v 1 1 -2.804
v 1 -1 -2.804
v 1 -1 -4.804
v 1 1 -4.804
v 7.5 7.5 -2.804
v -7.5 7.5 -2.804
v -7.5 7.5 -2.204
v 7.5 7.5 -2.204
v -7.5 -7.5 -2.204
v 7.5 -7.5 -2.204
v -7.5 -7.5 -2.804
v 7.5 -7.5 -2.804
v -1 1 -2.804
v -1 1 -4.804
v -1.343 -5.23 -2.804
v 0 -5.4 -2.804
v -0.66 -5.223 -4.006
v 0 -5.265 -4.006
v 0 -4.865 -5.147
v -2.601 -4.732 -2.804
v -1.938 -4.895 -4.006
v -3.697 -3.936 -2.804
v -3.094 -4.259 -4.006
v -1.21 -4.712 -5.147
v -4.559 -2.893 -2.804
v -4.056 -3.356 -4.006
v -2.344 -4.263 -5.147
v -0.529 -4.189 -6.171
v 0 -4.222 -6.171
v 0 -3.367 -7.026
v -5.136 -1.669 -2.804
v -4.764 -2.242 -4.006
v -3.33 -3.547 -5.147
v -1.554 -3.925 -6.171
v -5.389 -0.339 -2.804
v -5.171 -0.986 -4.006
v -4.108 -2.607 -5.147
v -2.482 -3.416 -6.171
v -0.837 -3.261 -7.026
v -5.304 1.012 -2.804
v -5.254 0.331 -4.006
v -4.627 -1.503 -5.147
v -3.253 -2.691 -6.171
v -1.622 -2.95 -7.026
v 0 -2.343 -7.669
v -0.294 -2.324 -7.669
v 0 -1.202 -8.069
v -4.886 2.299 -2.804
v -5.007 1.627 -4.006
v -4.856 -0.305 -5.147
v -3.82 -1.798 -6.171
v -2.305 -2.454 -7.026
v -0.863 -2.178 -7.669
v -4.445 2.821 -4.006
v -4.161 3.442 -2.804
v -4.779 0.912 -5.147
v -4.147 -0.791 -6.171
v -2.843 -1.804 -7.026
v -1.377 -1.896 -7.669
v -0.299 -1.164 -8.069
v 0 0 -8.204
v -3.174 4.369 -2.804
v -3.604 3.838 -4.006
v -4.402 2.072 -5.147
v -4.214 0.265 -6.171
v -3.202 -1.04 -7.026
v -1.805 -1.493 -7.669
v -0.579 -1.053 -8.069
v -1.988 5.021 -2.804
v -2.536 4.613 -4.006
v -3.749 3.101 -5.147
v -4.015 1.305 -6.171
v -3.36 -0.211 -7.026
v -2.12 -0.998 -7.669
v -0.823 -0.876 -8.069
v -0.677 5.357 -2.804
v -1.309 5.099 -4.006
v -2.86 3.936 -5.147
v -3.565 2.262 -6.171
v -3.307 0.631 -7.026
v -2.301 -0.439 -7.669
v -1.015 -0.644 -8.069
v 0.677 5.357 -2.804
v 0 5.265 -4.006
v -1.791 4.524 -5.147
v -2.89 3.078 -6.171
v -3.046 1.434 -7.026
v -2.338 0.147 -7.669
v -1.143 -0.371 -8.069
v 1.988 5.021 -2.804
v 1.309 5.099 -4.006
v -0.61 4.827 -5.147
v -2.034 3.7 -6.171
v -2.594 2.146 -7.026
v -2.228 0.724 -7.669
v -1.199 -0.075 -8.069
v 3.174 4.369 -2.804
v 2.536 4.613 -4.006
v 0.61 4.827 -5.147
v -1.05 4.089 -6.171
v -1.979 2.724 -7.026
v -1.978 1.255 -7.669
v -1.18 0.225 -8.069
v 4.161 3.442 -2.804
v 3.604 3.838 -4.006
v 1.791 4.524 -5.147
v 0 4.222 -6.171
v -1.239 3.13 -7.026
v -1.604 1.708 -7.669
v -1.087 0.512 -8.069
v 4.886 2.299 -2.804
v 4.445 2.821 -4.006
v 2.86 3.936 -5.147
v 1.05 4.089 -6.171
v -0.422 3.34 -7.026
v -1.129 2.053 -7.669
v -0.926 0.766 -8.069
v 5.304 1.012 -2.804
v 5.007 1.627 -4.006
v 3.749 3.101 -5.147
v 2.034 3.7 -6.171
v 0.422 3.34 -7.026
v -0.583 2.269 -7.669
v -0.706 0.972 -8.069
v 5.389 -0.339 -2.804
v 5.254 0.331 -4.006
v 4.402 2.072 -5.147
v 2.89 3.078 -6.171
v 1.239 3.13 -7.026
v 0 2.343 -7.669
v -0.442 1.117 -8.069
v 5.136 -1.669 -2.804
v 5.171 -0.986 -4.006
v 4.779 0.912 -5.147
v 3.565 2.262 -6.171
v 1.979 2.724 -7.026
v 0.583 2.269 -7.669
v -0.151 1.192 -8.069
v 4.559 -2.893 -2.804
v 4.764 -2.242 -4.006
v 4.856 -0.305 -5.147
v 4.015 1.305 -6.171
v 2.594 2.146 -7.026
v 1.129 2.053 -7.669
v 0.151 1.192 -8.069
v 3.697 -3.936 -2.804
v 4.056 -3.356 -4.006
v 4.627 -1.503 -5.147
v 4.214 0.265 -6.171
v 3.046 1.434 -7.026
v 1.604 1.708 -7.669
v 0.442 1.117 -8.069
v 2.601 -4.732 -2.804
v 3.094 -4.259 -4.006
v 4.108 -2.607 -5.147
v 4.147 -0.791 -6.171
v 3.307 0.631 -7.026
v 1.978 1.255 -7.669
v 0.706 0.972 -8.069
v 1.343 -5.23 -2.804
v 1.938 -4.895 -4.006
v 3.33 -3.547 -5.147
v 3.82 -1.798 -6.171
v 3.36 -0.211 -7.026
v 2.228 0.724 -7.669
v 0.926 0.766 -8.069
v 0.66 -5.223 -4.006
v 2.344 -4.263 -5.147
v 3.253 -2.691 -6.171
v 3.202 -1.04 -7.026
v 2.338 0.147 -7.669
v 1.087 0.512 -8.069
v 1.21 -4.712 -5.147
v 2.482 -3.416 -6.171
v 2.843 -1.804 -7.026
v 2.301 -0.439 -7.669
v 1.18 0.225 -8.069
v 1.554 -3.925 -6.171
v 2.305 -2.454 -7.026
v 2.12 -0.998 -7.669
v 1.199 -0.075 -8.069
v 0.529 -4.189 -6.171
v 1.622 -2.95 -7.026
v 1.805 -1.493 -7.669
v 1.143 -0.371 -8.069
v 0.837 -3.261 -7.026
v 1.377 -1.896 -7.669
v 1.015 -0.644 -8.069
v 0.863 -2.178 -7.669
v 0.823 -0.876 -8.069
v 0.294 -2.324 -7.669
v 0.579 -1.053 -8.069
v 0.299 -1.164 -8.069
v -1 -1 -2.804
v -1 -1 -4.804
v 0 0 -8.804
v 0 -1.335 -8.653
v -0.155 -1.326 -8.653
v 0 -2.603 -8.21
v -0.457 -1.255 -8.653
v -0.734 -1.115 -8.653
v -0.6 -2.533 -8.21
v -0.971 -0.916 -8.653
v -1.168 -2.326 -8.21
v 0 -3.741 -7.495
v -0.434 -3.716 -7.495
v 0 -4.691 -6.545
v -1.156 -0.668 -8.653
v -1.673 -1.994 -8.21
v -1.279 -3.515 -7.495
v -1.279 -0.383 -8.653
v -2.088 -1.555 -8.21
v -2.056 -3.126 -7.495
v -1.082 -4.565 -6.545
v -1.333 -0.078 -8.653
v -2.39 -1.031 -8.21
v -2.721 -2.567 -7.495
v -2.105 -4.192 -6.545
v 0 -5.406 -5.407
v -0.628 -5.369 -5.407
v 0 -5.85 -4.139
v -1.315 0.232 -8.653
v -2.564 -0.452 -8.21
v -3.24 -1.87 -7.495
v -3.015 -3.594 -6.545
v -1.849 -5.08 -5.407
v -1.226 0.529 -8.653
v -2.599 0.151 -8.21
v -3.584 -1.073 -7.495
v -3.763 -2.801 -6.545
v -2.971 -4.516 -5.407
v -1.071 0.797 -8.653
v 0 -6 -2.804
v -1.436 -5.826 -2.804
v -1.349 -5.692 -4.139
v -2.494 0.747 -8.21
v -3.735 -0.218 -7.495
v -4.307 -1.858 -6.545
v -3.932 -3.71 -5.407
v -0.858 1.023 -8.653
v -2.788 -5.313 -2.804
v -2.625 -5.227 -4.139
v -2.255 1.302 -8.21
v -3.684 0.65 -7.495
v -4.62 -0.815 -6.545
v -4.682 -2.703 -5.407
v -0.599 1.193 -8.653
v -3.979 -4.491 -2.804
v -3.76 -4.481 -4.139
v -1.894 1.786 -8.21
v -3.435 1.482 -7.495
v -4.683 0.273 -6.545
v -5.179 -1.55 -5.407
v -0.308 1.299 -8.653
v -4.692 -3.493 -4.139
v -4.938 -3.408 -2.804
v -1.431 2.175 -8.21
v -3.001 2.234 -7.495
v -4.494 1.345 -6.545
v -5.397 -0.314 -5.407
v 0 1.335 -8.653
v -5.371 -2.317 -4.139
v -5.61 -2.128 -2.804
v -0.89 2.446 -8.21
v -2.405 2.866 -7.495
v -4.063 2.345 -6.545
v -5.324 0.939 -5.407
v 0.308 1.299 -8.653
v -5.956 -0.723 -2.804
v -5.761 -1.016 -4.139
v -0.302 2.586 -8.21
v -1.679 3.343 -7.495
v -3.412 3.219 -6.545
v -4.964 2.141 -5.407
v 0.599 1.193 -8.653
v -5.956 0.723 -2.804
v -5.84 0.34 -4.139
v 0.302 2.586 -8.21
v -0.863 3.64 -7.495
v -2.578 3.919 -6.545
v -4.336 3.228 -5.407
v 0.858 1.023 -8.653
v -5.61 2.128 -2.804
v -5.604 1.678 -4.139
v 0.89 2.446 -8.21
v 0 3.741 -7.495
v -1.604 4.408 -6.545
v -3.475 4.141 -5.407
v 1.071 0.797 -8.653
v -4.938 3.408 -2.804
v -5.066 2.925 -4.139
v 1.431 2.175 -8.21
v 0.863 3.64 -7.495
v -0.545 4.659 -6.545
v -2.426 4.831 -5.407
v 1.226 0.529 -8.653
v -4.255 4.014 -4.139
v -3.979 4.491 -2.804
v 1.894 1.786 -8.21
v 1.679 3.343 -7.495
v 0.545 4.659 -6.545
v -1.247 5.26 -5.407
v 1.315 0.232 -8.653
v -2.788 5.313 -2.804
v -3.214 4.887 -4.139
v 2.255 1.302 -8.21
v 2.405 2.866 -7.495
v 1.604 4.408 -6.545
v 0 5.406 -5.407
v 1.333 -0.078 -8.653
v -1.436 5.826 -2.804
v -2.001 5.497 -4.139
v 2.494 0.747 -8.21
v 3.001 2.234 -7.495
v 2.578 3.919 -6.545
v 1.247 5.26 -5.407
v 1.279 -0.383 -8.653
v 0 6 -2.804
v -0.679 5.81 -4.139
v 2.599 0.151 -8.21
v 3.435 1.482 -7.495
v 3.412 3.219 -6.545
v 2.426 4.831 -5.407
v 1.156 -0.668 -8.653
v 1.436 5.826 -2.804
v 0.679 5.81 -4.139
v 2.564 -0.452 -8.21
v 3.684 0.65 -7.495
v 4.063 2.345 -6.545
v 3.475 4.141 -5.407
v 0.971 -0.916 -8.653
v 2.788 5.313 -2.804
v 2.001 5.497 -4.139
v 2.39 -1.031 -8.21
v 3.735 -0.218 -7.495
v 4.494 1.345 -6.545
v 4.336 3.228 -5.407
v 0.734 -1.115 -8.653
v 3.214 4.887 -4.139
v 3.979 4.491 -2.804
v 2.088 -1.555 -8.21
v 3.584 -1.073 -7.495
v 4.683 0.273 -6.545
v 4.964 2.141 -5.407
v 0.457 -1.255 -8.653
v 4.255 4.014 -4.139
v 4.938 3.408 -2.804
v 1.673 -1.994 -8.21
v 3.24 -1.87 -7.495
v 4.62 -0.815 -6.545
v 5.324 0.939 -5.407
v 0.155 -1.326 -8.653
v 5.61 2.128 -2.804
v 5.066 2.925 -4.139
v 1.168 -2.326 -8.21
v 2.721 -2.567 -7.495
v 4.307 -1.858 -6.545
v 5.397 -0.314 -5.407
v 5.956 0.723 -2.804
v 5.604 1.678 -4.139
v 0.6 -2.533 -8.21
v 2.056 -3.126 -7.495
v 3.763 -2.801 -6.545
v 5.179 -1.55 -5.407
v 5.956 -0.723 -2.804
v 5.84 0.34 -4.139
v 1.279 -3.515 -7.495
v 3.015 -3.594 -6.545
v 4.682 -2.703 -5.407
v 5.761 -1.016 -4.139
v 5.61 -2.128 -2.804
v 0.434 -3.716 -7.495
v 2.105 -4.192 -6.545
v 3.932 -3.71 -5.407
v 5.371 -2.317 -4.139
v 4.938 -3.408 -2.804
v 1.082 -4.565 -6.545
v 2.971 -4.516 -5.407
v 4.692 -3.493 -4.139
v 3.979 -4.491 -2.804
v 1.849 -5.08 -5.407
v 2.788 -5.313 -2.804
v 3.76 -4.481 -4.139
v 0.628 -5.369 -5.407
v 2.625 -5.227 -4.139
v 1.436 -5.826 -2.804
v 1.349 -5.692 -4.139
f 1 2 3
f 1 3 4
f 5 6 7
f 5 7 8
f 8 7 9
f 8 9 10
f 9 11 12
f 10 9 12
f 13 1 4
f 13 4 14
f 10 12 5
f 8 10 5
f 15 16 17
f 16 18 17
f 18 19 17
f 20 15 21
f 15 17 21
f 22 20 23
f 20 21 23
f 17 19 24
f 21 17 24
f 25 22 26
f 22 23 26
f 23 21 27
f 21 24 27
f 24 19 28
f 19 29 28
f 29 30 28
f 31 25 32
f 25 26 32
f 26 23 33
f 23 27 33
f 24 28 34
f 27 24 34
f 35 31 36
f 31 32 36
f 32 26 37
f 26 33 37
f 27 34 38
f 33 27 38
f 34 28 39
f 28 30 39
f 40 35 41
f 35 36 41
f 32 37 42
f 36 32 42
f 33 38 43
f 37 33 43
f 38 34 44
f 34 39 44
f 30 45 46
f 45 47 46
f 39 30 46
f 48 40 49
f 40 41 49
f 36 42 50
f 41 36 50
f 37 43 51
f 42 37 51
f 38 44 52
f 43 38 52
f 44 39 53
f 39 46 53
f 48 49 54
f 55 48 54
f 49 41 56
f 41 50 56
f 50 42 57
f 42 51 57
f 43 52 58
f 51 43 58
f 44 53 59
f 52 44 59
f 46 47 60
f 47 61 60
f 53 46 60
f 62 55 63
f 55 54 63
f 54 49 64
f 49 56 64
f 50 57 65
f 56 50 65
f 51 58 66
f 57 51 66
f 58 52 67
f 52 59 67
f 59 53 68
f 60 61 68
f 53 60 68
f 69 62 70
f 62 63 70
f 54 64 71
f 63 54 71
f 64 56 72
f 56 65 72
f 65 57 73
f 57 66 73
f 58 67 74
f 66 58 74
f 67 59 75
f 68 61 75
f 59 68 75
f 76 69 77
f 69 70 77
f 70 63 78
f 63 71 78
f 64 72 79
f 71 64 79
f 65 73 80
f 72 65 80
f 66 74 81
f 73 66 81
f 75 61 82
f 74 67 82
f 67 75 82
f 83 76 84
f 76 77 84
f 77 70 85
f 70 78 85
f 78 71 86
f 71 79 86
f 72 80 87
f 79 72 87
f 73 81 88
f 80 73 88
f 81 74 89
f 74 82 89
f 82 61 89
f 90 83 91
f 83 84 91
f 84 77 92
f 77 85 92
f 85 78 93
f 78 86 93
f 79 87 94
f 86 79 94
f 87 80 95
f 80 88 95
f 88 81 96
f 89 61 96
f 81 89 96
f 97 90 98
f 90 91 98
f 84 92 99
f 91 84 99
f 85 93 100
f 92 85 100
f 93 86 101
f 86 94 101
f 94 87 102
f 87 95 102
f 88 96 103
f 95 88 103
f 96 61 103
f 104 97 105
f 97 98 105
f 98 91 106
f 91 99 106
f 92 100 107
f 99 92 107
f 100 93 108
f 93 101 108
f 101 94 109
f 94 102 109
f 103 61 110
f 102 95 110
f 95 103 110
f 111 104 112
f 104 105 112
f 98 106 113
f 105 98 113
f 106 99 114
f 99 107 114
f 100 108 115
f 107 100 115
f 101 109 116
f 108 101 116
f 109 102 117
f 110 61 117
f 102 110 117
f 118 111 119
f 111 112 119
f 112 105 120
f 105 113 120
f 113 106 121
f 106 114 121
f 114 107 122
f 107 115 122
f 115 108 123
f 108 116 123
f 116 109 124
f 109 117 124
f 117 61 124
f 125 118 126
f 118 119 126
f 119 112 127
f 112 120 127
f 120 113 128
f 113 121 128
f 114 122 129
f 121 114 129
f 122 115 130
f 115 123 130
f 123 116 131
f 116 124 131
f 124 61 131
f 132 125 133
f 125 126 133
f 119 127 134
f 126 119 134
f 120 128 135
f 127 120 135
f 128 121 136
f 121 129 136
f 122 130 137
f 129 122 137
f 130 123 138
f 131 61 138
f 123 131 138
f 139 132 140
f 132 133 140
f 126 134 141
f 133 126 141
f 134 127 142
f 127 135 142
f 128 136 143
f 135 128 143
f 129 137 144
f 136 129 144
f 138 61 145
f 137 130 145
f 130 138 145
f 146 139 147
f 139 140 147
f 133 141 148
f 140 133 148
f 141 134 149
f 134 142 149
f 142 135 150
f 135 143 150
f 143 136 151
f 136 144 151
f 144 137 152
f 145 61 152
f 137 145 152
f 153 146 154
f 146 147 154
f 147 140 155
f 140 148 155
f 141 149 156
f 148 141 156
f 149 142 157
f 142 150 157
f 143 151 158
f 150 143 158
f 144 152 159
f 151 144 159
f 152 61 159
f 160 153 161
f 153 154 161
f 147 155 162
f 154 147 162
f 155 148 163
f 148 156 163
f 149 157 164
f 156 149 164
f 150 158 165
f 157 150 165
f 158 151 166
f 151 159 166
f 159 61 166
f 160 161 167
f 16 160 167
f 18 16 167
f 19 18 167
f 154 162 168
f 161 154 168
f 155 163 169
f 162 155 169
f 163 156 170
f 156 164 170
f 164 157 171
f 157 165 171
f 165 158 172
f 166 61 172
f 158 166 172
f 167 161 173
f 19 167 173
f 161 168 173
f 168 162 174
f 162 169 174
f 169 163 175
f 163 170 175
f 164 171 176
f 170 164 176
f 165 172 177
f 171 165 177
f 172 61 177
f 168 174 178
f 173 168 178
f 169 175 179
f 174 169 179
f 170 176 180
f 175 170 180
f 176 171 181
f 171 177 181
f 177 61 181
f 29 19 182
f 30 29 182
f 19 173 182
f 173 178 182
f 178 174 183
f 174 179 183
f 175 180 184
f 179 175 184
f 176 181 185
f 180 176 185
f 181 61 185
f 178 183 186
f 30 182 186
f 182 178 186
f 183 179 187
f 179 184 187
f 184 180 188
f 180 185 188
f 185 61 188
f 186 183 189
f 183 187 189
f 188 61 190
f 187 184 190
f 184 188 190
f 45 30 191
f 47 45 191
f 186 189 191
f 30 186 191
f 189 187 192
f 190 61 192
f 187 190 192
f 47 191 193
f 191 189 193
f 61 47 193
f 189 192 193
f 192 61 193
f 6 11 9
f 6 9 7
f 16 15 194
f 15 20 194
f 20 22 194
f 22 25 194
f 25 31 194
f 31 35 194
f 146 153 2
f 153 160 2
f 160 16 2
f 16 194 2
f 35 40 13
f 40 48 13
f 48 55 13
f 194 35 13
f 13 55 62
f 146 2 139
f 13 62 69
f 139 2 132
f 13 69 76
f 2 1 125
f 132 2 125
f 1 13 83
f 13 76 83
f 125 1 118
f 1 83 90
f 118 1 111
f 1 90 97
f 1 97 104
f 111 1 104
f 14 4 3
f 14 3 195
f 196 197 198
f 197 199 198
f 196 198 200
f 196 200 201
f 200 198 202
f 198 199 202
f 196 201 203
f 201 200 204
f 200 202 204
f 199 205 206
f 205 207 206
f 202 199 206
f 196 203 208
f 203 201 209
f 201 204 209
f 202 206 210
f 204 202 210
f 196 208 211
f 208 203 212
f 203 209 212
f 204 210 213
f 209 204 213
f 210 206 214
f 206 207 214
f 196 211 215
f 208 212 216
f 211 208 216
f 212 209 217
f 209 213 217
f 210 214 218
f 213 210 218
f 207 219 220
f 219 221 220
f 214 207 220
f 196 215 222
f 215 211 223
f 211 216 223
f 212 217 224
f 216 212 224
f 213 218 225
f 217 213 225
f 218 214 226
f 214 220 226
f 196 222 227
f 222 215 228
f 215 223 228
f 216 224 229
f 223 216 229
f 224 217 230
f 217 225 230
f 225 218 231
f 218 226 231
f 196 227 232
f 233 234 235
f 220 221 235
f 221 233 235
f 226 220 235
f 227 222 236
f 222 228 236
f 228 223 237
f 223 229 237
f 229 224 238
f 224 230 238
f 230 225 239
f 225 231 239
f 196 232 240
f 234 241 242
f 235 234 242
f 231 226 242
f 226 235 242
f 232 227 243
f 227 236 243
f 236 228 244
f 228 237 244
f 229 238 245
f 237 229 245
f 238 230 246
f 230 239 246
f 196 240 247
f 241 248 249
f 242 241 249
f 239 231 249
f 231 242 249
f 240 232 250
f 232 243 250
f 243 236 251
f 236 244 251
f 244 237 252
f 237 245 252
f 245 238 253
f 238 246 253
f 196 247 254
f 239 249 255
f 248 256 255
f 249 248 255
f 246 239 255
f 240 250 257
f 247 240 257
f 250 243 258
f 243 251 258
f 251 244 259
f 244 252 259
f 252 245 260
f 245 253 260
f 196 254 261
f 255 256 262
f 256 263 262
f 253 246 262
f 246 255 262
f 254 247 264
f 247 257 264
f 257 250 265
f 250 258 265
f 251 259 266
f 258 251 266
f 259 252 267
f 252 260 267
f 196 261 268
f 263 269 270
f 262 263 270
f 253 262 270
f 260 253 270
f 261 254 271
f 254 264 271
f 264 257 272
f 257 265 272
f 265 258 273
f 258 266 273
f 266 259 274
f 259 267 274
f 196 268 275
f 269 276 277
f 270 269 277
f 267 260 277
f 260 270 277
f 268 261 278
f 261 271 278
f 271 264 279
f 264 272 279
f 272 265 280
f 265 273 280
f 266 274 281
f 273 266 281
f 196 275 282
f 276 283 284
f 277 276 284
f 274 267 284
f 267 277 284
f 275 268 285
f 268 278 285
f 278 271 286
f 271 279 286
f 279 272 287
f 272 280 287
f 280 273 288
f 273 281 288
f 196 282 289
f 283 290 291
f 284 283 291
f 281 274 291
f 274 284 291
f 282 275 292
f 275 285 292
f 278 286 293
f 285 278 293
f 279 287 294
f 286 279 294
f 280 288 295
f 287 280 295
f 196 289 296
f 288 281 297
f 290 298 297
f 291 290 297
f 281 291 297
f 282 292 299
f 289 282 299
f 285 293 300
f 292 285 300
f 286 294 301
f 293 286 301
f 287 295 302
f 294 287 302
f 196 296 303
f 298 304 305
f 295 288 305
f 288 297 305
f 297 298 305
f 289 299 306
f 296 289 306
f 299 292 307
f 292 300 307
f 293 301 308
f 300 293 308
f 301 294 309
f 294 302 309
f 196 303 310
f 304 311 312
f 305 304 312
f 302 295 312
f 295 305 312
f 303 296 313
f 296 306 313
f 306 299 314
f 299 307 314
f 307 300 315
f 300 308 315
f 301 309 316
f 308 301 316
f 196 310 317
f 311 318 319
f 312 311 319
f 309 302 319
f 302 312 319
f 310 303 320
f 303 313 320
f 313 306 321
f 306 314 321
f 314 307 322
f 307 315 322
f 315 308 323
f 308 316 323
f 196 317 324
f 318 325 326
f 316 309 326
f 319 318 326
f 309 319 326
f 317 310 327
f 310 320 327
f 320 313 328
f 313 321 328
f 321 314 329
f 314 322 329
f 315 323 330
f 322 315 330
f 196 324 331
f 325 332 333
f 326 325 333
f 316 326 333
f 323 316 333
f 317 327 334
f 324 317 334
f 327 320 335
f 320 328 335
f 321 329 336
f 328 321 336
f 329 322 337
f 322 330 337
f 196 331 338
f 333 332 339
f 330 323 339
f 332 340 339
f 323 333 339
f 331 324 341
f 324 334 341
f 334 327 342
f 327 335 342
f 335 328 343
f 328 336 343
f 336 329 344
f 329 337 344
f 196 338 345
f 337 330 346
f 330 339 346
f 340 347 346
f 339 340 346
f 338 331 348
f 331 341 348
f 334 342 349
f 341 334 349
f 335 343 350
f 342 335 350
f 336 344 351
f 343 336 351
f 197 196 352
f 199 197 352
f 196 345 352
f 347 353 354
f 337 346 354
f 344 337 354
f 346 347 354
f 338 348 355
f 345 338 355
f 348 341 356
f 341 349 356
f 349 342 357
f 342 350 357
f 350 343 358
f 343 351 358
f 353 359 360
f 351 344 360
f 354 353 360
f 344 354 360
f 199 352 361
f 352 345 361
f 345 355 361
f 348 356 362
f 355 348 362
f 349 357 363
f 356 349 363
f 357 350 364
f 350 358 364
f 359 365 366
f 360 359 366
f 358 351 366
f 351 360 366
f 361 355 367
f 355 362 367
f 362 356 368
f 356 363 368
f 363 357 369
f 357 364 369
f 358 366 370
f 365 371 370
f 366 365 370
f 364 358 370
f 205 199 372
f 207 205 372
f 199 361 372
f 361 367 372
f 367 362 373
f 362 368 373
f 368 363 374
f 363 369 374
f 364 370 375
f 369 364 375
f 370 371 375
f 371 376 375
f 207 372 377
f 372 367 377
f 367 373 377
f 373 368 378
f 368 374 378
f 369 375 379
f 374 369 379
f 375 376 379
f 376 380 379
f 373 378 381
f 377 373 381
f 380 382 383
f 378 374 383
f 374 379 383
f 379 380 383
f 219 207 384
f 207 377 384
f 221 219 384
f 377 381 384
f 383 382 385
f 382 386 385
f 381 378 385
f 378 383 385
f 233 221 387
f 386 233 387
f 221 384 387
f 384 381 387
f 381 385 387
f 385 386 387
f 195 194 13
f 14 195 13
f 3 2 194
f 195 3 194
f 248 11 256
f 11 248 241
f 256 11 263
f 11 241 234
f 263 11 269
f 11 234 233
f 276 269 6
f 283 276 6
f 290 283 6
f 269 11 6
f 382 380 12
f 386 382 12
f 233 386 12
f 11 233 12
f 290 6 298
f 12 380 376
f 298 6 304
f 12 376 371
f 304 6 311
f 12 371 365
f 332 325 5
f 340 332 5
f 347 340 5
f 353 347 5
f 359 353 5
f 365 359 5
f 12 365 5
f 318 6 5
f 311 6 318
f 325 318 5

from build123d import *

# Parameters (mm, degrees)
SKETCH1_W           = 50
SKETCH1_H           = 50
BOSS_EXTRUDE1_DEPTH = 2
SCALE1_SCALE        = 0.5
SCALE2_SCALE        = 0.6
SKETCH3_W           = 2
SKETCH3_H           = 2
BOSS_EXTRUDE2_DEPTH = 2


with BuildPart() as part:
    # Sketch1 → Boss-Extrude1 (new body)
    with BuildSketch(Plane.XY):
        Rectangle(SKETCH1_W, SKETCH1_H)
    extrude(amount=BOSS_EXTRUDE1_DEPTH)

    # Sketch2 → Revolve2 (revolve)
    with BuildSketch(Plane(origin=(0, 0, 0), x_dir=(0, 0, -1), z_dir=(1, 0, 0))):
        with BuildLine():
            Line((0, -20), (0, -18))
            ThreePointArc((0, -18), (12.727922061, -12.727922061), (18, 0))
            Line((18, 0), (20, 0))
            ThreePointArc((20, 0), (14.142135624, -14.142135624), (0, -20))
        make_face()
    revolve(axis=Axis((0, 0, -18), (0, 0, -1)))


with BuildPart() as part_1:
    # Scale1: scaled about (0, 0, -4.005571342)
    add(part.part.scale(SCALE1_SCALE).moved(Location((0, 0, -2.002785671))))


with BuildPart() as part_2:
    # Scale2: scaled about (0, 0, -4.005571342)
    add(part_1.part.scale(SCALE2_SCALE).moved(Location((0, 0, -1.602228537))))

    # Sketch3 → Boss-Extrude2 (add)
    with BuildSketch(Plane(origin=(0, 0, -2.803899939), x_dir=(-1, 0, 0), z_dir=(0, 0, -1))):
        Rectangle(SKETCH3_W, SKETCH3_H)
    extrude(amount=BOSS_EXTRUDE2_DEPTH)


solid = part_2.part
